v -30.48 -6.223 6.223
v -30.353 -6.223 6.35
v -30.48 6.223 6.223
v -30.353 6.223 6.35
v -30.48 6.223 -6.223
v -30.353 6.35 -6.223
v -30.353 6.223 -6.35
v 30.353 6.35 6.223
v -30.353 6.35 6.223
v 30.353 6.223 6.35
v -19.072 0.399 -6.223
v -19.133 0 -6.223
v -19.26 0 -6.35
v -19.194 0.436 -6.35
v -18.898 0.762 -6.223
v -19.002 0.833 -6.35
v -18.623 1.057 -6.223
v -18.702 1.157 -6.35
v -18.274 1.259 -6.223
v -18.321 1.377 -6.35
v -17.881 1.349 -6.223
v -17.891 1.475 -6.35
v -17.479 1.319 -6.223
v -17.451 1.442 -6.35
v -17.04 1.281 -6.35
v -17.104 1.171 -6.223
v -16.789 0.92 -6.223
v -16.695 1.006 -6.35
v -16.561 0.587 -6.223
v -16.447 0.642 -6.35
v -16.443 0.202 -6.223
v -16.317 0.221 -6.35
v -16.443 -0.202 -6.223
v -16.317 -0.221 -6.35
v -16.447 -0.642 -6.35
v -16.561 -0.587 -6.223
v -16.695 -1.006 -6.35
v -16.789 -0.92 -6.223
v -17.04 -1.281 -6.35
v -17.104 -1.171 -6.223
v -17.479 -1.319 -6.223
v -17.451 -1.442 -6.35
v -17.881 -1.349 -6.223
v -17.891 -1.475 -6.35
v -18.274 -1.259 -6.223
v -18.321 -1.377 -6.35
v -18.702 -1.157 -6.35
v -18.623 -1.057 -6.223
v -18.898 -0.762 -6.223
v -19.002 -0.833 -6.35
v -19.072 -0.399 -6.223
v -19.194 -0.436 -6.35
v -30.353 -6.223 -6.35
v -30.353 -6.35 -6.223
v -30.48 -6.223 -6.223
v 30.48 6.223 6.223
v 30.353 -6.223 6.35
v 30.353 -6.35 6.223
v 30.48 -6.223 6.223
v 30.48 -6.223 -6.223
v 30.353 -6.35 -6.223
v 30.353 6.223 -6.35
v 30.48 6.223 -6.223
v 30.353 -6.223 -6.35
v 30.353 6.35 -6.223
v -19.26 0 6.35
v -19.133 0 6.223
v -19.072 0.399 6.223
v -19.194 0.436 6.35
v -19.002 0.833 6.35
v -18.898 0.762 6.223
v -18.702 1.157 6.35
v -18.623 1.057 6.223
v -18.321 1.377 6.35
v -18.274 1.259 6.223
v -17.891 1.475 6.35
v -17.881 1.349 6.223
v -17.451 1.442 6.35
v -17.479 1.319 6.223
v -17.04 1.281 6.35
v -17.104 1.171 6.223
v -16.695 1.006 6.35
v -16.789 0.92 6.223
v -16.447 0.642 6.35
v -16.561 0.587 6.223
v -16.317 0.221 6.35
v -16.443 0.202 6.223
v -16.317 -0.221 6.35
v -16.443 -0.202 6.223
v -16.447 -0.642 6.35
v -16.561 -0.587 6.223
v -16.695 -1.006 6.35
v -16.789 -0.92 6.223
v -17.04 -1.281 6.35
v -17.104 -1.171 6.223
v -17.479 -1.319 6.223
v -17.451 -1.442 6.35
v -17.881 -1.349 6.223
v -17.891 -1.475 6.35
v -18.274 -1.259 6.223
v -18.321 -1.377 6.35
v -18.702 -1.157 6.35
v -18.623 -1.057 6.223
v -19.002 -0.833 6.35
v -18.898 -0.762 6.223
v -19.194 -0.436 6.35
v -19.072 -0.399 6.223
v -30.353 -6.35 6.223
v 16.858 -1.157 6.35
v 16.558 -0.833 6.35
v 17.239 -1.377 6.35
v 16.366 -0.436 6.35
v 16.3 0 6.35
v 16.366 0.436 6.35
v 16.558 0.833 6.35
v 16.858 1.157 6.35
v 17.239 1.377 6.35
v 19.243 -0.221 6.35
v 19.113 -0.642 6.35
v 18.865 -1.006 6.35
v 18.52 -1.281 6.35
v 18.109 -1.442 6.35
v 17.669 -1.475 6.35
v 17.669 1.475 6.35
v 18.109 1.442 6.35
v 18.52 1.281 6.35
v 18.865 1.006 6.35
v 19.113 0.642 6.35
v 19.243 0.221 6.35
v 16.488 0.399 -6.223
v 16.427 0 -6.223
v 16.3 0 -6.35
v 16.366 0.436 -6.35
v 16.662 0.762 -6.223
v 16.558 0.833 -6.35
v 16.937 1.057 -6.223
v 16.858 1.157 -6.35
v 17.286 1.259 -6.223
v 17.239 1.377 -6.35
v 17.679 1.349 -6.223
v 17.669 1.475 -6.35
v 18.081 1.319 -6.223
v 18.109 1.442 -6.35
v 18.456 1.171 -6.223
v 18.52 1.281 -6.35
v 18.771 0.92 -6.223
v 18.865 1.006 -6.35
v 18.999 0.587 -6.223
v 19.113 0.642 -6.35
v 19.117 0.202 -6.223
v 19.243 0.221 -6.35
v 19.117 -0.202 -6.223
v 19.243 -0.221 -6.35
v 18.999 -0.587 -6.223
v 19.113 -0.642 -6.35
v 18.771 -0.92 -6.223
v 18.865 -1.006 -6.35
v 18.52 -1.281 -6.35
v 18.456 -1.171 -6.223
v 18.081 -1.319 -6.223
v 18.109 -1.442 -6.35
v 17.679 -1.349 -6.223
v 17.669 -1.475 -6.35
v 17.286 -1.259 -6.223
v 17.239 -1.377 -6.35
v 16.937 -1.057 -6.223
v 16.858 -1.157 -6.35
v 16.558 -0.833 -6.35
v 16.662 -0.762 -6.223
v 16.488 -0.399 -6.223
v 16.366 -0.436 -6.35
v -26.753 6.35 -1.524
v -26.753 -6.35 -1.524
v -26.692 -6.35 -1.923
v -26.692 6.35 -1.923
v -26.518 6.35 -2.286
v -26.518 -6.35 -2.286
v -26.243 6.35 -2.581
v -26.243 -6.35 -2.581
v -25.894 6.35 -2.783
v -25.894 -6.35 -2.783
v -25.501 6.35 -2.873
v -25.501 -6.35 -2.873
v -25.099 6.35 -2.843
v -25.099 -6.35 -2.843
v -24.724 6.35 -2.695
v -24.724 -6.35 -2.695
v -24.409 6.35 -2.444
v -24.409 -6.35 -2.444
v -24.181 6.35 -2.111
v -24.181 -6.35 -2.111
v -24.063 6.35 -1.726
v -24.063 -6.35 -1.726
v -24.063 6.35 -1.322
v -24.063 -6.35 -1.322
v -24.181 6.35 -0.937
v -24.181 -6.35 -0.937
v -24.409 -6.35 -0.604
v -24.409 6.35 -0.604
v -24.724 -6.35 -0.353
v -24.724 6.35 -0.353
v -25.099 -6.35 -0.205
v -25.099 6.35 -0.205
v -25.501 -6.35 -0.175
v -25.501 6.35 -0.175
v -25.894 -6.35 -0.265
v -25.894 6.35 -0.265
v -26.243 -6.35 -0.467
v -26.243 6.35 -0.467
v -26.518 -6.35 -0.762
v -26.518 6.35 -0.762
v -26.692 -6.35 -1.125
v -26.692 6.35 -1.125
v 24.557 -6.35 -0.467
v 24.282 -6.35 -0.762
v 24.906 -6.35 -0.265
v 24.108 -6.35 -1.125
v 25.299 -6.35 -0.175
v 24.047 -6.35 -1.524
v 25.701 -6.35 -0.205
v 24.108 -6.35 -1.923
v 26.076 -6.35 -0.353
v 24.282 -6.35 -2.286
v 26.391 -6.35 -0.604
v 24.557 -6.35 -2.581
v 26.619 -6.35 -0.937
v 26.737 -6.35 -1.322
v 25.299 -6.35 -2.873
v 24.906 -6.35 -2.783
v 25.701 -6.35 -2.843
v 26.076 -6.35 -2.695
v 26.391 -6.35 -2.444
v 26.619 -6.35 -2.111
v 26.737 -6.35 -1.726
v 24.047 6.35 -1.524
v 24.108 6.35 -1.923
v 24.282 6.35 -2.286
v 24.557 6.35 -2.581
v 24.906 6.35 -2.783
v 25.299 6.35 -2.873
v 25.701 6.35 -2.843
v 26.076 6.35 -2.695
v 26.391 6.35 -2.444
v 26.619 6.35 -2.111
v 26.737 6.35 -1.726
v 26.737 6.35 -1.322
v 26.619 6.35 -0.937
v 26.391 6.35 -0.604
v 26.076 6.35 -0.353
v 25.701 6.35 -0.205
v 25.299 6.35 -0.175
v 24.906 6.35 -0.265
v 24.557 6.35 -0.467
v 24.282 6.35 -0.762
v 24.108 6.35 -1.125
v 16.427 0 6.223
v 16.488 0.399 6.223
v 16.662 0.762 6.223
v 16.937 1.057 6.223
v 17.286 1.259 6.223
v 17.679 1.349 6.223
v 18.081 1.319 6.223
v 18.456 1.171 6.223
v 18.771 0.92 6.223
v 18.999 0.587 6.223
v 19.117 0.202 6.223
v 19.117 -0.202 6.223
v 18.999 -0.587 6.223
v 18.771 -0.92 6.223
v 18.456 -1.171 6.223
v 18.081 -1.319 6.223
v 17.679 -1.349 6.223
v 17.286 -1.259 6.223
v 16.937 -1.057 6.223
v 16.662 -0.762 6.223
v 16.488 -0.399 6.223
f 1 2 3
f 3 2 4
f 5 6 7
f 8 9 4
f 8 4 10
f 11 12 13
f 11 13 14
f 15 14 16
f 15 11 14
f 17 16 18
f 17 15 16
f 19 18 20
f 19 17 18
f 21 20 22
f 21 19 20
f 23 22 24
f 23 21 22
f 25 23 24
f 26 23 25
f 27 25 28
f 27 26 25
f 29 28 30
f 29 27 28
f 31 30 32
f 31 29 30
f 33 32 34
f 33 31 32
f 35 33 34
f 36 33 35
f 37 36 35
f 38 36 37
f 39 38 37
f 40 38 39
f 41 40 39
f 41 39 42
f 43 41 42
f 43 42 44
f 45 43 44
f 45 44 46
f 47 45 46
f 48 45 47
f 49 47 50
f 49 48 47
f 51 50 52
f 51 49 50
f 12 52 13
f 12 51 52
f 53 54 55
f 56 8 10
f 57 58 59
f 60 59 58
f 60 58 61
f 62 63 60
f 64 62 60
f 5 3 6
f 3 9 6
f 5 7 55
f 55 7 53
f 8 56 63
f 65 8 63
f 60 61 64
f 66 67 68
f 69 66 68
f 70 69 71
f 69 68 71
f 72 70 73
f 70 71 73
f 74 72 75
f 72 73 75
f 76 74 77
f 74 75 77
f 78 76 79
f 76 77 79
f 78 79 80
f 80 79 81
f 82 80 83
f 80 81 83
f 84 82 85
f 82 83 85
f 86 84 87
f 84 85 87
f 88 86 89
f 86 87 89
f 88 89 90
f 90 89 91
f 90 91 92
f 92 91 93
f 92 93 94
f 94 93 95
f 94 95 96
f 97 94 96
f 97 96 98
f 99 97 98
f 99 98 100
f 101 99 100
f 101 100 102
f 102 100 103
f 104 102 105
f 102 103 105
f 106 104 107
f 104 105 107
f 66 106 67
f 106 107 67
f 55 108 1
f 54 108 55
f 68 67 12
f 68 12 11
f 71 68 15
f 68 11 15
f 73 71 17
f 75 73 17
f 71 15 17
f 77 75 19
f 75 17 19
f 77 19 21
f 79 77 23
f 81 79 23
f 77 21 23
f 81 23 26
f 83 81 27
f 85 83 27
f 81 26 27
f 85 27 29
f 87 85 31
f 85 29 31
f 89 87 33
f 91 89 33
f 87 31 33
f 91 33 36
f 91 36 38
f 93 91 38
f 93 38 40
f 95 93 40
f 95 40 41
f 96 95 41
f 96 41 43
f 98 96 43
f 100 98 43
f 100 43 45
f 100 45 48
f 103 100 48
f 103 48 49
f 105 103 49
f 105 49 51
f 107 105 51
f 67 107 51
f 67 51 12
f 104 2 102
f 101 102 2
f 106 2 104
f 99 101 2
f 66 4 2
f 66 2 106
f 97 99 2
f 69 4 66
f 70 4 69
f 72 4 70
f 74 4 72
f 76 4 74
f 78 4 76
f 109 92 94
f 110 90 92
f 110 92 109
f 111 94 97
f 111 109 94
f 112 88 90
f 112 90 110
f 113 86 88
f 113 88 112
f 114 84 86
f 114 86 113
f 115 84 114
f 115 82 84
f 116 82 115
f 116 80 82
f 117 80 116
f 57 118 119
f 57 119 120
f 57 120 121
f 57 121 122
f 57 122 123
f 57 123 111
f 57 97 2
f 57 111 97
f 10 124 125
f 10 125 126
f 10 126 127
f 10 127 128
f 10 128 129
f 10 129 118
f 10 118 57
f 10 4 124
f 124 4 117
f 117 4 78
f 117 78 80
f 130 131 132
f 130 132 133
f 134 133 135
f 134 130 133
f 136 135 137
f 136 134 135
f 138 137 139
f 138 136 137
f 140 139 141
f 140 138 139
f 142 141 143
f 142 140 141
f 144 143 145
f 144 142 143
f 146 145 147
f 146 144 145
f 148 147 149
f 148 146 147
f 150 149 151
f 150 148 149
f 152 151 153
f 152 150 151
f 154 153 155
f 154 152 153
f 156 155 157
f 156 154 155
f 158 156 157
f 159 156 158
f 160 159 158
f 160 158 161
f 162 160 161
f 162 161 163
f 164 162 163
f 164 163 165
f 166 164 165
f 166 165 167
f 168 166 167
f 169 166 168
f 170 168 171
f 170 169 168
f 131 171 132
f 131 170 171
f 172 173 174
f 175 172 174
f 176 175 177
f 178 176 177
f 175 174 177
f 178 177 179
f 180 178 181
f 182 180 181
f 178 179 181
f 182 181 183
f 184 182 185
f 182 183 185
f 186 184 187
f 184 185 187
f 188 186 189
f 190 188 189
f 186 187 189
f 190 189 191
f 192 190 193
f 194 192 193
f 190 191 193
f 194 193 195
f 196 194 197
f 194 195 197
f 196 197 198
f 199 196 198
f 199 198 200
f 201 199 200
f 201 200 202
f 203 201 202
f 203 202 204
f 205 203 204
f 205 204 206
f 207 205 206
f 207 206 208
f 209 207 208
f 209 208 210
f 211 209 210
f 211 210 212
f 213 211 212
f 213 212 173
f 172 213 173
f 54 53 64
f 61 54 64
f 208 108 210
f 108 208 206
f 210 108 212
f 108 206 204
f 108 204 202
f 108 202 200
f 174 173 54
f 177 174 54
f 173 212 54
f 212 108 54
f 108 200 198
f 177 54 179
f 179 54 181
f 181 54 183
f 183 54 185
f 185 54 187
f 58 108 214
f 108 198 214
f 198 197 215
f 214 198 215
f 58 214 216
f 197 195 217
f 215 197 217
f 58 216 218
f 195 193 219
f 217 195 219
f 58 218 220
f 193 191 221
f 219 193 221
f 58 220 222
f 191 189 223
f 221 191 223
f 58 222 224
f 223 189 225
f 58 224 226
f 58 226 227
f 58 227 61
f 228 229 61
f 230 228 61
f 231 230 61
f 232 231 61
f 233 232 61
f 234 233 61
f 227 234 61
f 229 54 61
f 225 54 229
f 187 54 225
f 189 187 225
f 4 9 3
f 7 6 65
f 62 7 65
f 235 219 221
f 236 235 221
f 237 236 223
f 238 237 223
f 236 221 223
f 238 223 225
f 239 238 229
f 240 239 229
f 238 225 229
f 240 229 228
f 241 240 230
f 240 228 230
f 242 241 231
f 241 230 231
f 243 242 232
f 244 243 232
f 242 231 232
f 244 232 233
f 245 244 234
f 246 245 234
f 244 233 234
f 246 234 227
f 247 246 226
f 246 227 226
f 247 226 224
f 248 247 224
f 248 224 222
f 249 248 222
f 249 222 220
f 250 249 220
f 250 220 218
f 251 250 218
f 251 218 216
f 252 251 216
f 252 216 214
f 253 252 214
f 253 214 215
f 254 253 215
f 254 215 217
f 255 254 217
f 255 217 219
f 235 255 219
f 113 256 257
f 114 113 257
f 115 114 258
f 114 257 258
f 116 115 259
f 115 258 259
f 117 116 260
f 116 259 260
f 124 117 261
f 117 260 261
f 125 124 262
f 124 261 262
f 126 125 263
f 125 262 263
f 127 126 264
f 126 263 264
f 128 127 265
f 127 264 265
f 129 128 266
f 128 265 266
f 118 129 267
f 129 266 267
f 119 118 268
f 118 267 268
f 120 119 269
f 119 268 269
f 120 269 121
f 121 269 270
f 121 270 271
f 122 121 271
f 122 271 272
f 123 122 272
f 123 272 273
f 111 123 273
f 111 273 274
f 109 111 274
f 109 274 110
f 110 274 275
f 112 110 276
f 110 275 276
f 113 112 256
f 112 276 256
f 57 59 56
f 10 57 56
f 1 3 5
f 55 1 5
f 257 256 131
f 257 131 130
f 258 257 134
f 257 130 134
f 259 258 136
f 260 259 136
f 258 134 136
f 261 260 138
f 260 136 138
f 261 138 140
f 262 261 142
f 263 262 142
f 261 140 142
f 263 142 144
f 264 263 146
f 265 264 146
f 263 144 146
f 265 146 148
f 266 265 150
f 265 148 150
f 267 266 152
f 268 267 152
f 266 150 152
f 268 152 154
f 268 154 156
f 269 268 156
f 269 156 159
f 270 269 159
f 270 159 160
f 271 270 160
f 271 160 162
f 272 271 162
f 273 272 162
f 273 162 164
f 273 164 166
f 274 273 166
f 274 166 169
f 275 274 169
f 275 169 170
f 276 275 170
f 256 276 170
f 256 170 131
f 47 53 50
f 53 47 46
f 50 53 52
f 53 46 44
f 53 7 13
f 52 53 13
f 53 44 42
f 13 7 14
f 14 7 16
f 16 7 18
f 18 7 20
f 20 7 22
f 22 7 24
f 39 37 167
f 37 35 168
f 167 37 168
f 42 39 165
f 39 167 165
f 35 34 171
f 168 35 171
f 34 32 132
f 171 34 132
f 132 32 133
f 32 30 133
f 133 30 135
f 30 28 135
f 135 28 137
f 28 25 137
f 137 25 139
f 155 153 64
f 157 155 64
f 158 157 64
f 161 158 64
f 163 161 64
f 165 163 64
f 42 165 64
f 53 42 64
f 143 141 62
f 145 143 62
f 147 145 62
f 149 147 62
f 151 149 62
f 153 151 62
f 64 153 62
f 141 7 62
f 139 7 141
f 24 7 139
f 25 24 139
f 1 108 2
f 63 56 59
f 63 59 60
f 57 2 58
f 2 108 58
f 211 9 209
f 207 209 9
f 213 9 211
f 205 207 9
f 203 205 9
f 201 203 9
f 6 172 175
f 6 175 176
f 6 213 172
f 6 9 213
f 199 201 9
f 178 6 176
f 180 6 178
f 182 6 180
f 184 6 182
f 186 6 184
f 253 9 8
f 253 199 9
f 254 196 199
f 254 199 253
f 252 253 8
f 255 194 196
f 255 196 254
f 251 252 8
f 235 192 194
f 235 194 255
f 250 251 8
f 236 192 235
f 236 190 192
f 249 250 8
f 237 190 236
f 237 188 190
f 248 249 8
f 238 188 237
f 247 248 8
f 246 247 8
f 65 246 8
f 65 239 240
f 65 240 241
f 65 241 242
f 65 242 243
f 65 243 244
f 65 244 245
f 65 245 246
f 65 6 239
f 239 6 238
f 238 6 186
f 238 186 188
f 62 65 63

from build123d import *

# Parameters (mm, degrees)
SKETCH1_W             = 60.96
SKETCH1_H             = 12.7
BOSS_EXTRUDE1_DEPTH   = 6.35
F_6_32_TAPPED_HOLE1_D = 2.7051
F_6_32_TAPPED_HOLE2_D = 2.7051
CHAMFER1_SIZE         = 0.127


with BuildPart() as part:
    # Sketch1 → Boss-Extrude1 (new body, symmetric)
    with BuildSketch(Plane(origin=(0, 0, 0), x_dir=(1, 0, 0), z_dir=(0, 1, 0))):
        Rectangle(SKETCH1_W, SKETCH1_H)
    extrude(amount=BOSS_EXTRUDE1_DEPTH, both=True)

    # #6-32 Tapped Hole1 (through all)
    with Locations(Plane(origin=(0, 6.35, 0), x_dir=(1, 0, 0), z_dir=(0, 1, 0))):
        with Locations((-25.4, 1.524), (25.4, 1.524)):
            Hole(F_6_32_TAPPED_HOLE1_D / 2)

    # #6-32 Tapped Hole2 (through all)
    with Locations(Plane.XY.offset(6.35)):
        with Locations((-17.78, 0), (17.78, 0)):
            Hole(F_6_32_TAPPED_HOLE2_D / 2)

    # Chamfer1
    chamfer1_edges = [part.edges().sort_by_distance(p)[0] for p in [
        (-30.48, 6.35, 0),
        (0, 6.35, 6.35),
        (19.13255, 0, 6.35),
        (19.13255, 0, -6.35),
        (-16.42745, 0, 6.35),
        (-16.42745, 0, -6.35),
        (30.48, 6.35, 0),
        (0, -6.35, 6.35),
        (-30.48, -6.35, 0),
        (0, -6.35, -6.35),
        (30.48, -6.35, 0),
        (0, 6.35, -6.35),
        (30.48, 0, 6.35),
        (-30.48, 0, 6.35),
        (-30.48, 0, -6.35),
        (30.48, 0, -6.35),
    ]]
    chamfer(chamfer1_edges, length=CHAMFER1_SIZE)


solid = part.part
